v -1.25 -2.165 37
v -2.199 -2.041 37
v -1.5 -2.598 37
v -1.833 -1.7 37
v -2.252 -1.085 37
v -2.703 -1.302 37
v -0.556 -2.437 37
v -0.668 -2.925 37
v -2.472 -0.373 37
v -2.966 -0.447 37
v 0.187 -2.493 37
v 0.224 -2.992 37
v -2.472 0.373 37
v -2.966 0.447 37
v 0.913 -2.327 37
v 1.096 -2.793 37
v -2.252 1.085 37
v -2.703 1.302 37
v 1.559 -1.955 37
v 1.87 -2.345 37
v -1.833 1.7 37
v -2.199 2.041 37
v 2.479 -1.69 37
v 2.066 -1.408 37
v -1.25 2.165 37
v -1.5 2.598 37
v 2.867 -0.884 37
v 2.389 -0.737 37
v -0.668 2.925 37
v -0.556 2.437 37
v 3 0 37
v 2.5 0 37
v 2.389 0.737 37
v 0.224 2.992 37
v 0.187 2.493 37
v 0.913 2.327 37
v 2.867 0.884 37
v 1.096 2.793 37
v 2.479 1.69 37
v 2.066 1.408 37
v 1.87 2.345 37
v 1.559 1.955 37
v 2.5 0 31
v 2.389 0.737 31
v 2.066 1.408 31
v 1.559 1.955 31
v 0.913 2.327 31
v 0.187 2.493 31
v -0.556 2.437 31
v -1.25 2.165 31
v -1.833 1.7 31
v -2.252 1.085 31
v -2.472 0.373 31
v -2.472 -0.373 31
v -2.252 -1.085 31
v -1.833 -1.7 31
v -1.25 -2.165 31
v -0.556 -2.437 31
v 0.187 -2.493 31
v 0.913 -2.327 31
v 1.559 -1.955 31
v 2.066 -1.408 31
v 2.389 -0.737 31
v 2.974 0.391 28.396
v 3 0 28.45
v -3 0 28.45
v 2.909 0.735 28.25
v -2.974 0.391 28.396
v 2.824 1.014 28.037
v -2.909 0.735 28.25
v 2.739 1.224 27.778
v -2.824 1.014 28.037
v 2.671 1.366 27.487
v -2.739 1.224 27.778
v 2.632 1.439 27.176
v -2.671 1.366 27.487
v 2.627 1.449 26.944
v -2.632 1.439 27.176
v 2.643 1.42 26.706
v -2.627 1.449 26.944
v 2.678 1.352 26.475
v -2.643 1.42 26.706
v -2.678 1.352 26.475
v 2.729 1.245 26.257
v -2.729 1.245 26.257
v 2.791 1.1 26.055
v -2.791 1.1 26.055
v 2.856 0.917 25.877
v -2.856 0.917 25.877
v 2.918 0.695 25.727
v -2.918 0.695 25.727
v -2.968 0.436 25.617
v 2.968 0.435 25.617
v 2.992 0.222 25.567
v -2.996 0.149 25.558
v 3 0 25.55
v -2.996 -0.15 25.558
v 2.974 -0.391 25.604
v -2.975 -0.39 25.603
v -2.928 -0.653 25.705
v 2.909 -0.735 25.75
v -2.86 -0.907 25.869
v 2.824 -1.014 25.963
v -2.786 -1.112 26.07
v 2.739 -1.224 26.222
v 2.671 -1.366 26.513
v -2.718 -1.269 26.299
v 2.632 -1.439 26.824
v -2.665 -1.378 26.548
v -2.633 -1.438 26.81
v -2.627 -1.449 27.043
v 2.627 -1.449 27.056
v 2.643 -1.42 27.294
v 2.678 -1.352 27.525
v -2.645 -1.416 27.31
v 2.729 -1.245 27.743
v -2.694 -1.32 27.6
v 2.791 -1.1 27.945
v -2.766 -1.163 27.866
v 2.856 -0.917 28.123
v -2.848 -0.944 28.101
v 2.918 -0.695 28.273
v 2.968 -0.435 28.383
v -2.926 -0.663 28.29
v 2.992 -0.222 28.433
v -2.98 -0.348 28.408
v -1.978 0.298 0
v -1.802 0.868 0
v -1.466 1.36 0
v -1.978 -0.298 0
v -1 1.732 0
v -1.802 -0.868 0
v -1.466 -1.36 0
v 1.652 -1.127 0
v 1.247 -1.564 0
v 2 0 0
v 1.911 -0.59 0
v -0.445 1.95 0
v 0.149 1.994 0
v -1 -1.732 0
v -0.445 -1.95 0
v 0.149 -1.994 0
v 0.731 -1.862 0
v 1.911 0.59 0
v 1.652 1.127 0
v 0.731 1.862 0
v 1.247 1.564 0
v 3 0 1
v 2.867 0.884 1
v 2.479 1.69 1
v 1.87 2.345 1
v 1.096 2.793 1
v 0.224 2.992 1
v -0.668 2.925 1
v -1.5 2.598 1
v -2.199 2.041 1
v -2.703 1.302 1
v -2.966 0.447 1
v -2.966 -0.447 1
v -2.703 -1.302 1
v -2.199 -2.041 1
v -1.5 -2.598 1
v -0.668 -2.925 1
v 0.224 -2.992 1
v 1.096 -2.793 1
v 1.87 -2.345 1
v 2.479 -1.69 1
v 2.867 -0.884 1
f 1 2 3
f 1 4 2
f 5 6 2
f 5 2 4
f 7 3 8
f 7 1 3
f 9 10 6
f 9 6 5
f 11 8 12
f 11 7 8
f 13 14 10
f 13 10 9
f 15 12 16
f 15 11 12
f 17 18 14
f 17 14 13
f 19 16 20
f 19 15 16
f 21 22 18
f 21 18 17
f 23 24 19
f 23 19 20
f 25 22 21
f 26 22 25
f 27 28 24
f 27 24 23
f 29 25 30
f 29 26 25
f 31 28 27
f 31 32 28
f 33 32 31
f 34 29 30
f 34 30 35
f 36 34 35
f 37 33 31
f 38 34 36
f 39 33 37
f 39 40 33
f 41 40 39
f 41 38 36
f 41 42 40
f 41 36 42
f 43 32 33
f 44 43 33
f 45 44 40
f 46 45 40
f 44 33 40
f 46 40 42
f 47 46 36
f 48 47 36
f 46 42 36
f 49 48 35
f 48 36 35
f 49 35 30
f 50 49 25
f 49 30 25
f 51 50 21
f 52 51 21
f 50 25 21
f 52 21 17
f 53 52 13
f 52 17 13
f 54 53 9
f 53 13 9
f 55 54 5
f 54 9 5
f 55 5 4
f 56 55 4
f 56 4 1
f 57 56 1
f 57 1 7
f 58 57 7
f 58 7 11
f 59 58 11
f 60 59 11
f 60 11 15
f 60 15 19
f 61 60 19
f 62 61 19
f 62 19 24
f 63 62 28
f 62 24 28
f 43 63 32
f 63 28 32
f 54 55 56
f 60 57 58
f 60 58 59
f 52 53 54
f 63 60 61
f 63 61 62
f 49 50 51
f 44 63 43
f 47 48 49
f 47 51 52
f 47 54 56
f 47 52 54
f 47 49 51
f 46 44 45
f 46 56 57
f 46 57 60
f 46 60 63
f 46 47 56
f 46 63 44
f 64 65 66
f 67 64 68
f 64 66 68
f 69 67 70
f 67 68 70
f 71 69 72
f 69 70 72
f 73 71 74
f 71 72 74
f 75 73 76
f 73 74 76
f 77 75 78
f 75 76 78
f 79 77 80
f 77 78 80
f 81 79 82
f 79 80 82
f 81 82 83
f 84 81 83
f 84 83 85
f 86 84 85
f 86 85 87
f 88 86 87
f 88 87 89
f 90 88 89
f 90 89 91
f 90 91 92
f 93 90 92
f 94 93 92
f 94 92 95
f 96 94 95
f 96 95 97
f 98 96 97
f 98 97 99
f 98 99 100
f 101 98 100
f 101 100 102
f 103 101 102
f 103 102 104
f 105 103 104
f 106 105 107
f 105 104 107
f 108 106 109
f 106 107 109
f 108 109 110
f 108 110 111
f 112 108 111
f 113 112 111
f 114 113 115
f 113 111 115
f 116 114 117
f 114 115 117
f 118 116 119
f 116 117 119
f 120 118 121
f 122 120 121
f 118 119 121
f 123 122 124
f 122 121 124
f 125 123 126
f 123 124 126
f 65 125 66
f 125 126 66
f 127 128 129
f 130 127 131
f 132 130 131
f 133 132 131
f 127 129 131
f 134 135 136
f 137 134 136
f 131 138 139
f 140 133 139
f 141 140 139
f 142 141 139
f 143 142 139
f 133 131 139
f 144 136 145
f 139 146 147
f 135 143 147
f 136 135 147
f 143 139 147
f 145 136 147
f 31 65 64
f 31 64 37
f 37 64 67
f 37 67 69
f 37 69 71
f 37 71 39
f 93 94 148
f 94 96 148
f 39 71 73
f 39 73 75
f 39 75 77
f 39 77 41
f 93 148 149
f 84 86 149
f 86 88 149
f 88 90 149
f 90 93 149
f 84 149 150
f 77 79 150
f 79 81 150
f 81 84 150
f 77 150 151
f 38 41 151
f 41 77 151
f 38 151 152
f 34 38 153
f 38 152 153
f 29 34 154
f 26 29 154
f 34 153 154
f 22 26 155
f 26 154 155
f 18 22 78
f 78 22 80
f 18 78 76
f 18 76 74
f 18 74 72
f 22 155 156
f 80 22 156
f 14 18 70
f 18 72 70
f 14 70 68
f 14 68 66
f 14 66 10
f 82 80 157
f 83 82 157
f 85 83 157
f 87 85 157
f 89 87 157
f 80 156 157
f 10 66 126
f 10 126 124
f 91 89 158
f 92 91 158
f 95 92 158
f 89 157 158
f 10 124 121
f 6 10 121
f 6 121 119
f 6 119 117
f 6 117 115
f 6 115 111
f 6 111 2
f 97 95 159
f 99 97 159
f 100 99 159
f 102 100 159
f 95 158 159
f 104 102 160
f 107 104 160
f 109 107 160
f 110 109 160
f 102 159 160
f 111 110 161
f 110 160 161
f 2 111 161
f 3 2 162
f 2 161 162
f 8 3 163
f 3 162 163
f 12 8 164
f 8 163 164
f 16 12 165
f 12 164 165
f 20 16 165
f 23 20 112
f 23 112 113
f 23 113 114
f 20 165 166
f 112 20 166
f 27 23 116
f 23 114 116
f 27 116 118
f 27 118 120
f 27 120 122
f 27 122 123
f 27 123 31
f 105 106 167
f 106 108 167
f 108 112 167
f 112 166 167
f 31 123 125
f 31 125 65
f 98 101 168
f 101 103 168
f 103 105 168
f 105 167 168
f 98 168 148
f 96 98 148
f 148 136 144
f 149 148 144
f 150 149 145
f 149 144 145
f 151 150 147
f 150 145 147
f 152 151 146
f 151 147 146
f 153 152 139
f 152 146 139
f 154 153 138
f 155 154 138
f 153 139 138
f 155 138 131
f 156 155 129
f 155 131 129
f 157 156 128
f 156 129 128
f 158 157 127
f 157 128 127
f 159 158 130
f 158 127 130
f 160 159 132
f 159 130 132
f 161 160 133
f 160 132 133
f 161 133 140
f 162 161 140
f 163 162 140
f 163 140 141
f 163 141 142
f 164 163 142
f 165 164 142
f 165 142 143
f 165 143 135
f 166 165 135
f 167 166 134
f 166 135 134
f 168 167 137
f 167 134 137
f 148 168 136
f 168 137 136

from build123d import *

# Parameters (mm, degrees)
SKETCH_1_R          = 3
EXTRUDE_1_DEPTH     = 37
SKETCH_2_R          = 2.5
CUT_EXTRUDE_1_DEPTH = 6
CHAMFER_1_SIZE      = 1
M3_5X0_61_D         = 2.9


with BuildPart() as part:
    # Эскиз1 → Бобышка-Вытянуть1 (new body)
    with BuildSketch(Plane.XY):
        Circle(SKETCH_1_R)
    extrude(amount=EXTRUDE_1_DEPTH)

    # Эскиз2 → Вырез-Вытянуть1 (cut)
    with BuildSketch(Plane.XY.offset(37)):
        Circle(SKETCH_2_R)
    extrude(amount=-CUT_EXTRUDE_1_DEPTH, mode=Mode.SUBTRACT)

    # Фаска1
    chamfer_1_edges = [part.edges().sort_by_distance(p)[0] for p in [
        (-3, 0, 0),
    ]]
    chamfer(chamfer_1_edges, length=CHAMFER_1_SIZE)

    # Отверстие обработанное метчиком M3.5x0.61 (through all)
    with Locations(Plane(origin=(3, 0, 0), x_dir=(0, 0, -1), z_dir=(1, 0, 0))):
        with Locations((-27, 0)):
            Hole(M3_5X0_61_D / 2)


solid = part.part
